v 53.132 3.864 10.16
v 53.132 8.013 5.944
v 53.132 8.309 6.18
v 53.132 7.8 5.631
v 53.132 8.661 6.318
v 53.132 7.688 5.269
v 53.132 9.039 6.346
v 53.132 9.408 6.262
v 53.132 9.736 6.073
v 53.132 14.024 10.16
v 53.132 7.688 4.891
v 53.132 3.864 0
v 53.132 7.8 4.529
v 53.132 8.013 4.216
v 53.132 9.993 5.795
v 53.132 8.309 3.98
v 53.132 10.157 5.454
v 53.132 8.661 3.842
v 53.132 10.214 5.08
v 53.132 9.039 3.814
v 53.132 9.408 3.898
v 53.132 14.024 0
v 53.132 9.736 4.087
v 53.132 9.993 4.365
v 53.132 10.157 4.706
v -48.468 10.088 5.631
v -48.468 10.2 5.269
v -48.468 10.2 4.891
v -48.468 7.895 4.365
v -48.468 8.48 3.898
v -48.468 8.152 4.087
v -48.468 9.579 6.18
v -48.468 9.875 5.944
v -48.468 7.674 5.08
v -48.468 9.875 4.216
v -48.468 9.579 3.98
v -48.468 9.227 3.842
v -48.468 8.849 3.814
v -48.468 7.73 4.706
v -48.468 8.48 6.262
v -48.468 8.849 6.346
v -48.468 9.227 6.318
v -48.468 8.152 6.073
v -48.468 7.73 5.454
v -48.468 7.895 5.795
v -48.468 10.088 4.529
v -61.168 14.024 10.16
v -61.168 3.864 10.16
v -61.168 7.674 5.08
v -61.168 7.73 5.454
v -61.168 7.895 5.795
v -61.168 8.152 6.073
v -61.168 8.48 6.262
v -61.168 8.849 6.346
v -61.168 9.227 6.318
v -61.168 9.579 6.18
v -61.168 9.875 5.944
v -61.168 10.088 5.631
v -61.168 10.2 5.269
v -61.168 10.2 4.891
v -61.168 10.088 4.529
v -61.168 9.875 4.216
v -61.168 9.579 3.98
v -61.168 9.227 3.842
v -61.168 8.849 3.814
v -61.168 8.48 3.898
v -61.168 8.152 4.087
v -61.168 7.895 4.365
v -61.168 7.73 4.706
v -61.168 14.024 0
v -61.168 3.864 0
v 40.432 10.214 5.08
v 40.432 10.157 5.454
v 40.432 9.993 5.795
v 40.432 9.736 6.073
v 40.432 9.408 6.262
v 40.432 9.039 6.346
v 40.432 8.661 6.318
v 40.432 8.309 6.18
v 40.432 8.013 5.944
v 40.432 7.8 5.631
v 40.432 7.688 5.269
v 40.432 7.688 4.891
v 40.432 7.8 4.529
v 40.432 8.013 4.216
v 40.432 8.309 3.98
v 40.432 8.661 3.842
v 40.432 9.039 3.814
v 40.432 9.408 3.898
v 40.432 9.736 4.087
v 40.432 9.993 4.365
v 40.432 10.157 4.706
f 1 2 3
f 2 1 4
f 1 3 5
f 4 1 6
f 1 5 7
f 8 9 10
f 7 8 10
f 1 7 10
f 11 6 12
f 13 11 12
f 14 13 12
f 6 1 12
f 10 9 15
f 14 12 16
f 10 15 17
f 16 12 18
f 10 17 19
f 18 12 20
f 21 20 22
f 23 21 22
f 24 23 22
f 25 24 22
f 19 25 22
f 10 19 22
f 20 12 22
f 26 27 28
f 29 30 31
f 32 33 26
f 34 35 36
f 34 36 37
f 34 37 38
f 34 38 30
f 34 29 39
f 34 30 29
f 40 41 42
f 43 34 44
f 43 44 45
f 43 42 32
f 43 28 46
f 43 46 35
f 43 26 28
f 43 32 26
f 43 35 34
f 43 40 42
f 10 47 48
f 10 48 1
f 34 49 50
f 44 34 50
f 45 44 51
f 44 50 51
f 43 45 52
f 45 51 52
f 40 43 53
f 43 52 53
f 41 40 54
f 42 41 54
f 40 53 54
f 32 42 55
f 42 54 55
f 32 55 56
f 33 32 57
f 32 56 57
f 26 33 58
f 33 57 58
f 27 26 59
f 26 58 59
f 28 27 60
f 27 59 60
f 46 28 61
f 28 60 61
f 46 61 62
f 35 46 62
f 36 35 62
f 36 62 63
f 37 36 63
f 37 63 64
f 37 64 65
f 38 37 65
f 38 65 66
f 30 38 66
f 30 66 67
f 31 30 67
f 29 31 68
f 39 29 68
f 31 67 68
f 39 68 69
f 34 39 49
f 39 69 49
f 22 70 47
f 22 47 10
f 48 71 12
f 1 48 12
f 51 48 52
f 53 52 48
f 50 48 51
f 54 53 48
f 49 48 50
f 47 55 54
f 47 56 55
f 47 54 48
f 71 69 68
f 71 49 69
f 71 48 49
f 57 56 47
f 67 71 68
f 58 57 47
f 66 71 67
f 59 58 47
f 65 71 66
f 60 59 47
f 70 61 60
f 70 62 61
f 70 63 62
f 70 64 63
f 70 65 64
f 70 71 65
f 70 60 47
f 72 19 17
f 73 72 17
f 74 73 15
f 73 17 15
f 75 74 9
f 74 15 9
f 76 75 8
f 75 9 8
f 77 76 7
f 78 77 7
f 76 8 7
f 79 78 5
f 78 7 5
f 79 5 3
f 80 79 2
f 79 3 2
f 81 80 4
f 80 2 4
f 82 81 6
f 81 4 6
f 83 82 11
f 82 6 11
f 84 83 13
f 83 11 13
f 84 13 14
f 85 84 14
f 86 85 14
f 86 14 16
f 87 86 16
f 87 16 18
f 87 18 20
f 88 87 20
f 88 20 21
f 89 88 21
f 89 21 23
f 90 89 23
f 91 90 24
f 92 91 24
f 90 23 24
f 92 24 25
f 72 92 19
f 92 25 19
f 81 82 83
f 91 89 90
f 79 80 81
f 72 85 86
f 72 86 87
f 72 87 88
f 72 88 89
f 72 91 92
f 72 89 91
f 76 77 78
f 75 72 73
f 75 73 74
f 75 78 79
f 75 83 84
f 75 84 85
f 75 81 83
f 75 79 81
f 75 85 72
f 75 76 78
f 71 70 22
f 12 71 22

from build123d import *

# Parameters (mm, degrees)
F0_W     = 114.3
F0_H     = 10.16
F1_DEPTH = 10.16
F3_R     = 1.27
F4_DEPTH = 12.7
F2_R     = 1.27
F5_DEPTH = 12.7


with BuildPart() as f1:
    # F0 (on Top) → F1 (new body)
    with BuildSketch(Plane.XY):
        with Locations((-4.017718, 8.943918)):
            Rectangle(F0_W, F0_H)
    extrude(amount=F1_DEPTH)

    # F3 (on face) → F4 (cut)
    with BuildSketch(Plane.YZ.offset(53.132282)):
        with Locations((8.943918, 5.08)):
            Circle(F3_R)
    extrude(amount=-F4_DEPTH, mode=Mode.SUBTRACT)

    # F2 (on face) → F5 (cut)
    with BuildSketch(Plane(origin=(-61.167718, 0, 0), x_dir=(0, -1, 0), z_dir=(-1, 0, 0))):
        with Locations((-8.943918, 5.08)):
            Circle(F2_R)
    extrude(amount=-F5_DEPTH, mode=Mode.SUBTRACT)


solid = f1.part
